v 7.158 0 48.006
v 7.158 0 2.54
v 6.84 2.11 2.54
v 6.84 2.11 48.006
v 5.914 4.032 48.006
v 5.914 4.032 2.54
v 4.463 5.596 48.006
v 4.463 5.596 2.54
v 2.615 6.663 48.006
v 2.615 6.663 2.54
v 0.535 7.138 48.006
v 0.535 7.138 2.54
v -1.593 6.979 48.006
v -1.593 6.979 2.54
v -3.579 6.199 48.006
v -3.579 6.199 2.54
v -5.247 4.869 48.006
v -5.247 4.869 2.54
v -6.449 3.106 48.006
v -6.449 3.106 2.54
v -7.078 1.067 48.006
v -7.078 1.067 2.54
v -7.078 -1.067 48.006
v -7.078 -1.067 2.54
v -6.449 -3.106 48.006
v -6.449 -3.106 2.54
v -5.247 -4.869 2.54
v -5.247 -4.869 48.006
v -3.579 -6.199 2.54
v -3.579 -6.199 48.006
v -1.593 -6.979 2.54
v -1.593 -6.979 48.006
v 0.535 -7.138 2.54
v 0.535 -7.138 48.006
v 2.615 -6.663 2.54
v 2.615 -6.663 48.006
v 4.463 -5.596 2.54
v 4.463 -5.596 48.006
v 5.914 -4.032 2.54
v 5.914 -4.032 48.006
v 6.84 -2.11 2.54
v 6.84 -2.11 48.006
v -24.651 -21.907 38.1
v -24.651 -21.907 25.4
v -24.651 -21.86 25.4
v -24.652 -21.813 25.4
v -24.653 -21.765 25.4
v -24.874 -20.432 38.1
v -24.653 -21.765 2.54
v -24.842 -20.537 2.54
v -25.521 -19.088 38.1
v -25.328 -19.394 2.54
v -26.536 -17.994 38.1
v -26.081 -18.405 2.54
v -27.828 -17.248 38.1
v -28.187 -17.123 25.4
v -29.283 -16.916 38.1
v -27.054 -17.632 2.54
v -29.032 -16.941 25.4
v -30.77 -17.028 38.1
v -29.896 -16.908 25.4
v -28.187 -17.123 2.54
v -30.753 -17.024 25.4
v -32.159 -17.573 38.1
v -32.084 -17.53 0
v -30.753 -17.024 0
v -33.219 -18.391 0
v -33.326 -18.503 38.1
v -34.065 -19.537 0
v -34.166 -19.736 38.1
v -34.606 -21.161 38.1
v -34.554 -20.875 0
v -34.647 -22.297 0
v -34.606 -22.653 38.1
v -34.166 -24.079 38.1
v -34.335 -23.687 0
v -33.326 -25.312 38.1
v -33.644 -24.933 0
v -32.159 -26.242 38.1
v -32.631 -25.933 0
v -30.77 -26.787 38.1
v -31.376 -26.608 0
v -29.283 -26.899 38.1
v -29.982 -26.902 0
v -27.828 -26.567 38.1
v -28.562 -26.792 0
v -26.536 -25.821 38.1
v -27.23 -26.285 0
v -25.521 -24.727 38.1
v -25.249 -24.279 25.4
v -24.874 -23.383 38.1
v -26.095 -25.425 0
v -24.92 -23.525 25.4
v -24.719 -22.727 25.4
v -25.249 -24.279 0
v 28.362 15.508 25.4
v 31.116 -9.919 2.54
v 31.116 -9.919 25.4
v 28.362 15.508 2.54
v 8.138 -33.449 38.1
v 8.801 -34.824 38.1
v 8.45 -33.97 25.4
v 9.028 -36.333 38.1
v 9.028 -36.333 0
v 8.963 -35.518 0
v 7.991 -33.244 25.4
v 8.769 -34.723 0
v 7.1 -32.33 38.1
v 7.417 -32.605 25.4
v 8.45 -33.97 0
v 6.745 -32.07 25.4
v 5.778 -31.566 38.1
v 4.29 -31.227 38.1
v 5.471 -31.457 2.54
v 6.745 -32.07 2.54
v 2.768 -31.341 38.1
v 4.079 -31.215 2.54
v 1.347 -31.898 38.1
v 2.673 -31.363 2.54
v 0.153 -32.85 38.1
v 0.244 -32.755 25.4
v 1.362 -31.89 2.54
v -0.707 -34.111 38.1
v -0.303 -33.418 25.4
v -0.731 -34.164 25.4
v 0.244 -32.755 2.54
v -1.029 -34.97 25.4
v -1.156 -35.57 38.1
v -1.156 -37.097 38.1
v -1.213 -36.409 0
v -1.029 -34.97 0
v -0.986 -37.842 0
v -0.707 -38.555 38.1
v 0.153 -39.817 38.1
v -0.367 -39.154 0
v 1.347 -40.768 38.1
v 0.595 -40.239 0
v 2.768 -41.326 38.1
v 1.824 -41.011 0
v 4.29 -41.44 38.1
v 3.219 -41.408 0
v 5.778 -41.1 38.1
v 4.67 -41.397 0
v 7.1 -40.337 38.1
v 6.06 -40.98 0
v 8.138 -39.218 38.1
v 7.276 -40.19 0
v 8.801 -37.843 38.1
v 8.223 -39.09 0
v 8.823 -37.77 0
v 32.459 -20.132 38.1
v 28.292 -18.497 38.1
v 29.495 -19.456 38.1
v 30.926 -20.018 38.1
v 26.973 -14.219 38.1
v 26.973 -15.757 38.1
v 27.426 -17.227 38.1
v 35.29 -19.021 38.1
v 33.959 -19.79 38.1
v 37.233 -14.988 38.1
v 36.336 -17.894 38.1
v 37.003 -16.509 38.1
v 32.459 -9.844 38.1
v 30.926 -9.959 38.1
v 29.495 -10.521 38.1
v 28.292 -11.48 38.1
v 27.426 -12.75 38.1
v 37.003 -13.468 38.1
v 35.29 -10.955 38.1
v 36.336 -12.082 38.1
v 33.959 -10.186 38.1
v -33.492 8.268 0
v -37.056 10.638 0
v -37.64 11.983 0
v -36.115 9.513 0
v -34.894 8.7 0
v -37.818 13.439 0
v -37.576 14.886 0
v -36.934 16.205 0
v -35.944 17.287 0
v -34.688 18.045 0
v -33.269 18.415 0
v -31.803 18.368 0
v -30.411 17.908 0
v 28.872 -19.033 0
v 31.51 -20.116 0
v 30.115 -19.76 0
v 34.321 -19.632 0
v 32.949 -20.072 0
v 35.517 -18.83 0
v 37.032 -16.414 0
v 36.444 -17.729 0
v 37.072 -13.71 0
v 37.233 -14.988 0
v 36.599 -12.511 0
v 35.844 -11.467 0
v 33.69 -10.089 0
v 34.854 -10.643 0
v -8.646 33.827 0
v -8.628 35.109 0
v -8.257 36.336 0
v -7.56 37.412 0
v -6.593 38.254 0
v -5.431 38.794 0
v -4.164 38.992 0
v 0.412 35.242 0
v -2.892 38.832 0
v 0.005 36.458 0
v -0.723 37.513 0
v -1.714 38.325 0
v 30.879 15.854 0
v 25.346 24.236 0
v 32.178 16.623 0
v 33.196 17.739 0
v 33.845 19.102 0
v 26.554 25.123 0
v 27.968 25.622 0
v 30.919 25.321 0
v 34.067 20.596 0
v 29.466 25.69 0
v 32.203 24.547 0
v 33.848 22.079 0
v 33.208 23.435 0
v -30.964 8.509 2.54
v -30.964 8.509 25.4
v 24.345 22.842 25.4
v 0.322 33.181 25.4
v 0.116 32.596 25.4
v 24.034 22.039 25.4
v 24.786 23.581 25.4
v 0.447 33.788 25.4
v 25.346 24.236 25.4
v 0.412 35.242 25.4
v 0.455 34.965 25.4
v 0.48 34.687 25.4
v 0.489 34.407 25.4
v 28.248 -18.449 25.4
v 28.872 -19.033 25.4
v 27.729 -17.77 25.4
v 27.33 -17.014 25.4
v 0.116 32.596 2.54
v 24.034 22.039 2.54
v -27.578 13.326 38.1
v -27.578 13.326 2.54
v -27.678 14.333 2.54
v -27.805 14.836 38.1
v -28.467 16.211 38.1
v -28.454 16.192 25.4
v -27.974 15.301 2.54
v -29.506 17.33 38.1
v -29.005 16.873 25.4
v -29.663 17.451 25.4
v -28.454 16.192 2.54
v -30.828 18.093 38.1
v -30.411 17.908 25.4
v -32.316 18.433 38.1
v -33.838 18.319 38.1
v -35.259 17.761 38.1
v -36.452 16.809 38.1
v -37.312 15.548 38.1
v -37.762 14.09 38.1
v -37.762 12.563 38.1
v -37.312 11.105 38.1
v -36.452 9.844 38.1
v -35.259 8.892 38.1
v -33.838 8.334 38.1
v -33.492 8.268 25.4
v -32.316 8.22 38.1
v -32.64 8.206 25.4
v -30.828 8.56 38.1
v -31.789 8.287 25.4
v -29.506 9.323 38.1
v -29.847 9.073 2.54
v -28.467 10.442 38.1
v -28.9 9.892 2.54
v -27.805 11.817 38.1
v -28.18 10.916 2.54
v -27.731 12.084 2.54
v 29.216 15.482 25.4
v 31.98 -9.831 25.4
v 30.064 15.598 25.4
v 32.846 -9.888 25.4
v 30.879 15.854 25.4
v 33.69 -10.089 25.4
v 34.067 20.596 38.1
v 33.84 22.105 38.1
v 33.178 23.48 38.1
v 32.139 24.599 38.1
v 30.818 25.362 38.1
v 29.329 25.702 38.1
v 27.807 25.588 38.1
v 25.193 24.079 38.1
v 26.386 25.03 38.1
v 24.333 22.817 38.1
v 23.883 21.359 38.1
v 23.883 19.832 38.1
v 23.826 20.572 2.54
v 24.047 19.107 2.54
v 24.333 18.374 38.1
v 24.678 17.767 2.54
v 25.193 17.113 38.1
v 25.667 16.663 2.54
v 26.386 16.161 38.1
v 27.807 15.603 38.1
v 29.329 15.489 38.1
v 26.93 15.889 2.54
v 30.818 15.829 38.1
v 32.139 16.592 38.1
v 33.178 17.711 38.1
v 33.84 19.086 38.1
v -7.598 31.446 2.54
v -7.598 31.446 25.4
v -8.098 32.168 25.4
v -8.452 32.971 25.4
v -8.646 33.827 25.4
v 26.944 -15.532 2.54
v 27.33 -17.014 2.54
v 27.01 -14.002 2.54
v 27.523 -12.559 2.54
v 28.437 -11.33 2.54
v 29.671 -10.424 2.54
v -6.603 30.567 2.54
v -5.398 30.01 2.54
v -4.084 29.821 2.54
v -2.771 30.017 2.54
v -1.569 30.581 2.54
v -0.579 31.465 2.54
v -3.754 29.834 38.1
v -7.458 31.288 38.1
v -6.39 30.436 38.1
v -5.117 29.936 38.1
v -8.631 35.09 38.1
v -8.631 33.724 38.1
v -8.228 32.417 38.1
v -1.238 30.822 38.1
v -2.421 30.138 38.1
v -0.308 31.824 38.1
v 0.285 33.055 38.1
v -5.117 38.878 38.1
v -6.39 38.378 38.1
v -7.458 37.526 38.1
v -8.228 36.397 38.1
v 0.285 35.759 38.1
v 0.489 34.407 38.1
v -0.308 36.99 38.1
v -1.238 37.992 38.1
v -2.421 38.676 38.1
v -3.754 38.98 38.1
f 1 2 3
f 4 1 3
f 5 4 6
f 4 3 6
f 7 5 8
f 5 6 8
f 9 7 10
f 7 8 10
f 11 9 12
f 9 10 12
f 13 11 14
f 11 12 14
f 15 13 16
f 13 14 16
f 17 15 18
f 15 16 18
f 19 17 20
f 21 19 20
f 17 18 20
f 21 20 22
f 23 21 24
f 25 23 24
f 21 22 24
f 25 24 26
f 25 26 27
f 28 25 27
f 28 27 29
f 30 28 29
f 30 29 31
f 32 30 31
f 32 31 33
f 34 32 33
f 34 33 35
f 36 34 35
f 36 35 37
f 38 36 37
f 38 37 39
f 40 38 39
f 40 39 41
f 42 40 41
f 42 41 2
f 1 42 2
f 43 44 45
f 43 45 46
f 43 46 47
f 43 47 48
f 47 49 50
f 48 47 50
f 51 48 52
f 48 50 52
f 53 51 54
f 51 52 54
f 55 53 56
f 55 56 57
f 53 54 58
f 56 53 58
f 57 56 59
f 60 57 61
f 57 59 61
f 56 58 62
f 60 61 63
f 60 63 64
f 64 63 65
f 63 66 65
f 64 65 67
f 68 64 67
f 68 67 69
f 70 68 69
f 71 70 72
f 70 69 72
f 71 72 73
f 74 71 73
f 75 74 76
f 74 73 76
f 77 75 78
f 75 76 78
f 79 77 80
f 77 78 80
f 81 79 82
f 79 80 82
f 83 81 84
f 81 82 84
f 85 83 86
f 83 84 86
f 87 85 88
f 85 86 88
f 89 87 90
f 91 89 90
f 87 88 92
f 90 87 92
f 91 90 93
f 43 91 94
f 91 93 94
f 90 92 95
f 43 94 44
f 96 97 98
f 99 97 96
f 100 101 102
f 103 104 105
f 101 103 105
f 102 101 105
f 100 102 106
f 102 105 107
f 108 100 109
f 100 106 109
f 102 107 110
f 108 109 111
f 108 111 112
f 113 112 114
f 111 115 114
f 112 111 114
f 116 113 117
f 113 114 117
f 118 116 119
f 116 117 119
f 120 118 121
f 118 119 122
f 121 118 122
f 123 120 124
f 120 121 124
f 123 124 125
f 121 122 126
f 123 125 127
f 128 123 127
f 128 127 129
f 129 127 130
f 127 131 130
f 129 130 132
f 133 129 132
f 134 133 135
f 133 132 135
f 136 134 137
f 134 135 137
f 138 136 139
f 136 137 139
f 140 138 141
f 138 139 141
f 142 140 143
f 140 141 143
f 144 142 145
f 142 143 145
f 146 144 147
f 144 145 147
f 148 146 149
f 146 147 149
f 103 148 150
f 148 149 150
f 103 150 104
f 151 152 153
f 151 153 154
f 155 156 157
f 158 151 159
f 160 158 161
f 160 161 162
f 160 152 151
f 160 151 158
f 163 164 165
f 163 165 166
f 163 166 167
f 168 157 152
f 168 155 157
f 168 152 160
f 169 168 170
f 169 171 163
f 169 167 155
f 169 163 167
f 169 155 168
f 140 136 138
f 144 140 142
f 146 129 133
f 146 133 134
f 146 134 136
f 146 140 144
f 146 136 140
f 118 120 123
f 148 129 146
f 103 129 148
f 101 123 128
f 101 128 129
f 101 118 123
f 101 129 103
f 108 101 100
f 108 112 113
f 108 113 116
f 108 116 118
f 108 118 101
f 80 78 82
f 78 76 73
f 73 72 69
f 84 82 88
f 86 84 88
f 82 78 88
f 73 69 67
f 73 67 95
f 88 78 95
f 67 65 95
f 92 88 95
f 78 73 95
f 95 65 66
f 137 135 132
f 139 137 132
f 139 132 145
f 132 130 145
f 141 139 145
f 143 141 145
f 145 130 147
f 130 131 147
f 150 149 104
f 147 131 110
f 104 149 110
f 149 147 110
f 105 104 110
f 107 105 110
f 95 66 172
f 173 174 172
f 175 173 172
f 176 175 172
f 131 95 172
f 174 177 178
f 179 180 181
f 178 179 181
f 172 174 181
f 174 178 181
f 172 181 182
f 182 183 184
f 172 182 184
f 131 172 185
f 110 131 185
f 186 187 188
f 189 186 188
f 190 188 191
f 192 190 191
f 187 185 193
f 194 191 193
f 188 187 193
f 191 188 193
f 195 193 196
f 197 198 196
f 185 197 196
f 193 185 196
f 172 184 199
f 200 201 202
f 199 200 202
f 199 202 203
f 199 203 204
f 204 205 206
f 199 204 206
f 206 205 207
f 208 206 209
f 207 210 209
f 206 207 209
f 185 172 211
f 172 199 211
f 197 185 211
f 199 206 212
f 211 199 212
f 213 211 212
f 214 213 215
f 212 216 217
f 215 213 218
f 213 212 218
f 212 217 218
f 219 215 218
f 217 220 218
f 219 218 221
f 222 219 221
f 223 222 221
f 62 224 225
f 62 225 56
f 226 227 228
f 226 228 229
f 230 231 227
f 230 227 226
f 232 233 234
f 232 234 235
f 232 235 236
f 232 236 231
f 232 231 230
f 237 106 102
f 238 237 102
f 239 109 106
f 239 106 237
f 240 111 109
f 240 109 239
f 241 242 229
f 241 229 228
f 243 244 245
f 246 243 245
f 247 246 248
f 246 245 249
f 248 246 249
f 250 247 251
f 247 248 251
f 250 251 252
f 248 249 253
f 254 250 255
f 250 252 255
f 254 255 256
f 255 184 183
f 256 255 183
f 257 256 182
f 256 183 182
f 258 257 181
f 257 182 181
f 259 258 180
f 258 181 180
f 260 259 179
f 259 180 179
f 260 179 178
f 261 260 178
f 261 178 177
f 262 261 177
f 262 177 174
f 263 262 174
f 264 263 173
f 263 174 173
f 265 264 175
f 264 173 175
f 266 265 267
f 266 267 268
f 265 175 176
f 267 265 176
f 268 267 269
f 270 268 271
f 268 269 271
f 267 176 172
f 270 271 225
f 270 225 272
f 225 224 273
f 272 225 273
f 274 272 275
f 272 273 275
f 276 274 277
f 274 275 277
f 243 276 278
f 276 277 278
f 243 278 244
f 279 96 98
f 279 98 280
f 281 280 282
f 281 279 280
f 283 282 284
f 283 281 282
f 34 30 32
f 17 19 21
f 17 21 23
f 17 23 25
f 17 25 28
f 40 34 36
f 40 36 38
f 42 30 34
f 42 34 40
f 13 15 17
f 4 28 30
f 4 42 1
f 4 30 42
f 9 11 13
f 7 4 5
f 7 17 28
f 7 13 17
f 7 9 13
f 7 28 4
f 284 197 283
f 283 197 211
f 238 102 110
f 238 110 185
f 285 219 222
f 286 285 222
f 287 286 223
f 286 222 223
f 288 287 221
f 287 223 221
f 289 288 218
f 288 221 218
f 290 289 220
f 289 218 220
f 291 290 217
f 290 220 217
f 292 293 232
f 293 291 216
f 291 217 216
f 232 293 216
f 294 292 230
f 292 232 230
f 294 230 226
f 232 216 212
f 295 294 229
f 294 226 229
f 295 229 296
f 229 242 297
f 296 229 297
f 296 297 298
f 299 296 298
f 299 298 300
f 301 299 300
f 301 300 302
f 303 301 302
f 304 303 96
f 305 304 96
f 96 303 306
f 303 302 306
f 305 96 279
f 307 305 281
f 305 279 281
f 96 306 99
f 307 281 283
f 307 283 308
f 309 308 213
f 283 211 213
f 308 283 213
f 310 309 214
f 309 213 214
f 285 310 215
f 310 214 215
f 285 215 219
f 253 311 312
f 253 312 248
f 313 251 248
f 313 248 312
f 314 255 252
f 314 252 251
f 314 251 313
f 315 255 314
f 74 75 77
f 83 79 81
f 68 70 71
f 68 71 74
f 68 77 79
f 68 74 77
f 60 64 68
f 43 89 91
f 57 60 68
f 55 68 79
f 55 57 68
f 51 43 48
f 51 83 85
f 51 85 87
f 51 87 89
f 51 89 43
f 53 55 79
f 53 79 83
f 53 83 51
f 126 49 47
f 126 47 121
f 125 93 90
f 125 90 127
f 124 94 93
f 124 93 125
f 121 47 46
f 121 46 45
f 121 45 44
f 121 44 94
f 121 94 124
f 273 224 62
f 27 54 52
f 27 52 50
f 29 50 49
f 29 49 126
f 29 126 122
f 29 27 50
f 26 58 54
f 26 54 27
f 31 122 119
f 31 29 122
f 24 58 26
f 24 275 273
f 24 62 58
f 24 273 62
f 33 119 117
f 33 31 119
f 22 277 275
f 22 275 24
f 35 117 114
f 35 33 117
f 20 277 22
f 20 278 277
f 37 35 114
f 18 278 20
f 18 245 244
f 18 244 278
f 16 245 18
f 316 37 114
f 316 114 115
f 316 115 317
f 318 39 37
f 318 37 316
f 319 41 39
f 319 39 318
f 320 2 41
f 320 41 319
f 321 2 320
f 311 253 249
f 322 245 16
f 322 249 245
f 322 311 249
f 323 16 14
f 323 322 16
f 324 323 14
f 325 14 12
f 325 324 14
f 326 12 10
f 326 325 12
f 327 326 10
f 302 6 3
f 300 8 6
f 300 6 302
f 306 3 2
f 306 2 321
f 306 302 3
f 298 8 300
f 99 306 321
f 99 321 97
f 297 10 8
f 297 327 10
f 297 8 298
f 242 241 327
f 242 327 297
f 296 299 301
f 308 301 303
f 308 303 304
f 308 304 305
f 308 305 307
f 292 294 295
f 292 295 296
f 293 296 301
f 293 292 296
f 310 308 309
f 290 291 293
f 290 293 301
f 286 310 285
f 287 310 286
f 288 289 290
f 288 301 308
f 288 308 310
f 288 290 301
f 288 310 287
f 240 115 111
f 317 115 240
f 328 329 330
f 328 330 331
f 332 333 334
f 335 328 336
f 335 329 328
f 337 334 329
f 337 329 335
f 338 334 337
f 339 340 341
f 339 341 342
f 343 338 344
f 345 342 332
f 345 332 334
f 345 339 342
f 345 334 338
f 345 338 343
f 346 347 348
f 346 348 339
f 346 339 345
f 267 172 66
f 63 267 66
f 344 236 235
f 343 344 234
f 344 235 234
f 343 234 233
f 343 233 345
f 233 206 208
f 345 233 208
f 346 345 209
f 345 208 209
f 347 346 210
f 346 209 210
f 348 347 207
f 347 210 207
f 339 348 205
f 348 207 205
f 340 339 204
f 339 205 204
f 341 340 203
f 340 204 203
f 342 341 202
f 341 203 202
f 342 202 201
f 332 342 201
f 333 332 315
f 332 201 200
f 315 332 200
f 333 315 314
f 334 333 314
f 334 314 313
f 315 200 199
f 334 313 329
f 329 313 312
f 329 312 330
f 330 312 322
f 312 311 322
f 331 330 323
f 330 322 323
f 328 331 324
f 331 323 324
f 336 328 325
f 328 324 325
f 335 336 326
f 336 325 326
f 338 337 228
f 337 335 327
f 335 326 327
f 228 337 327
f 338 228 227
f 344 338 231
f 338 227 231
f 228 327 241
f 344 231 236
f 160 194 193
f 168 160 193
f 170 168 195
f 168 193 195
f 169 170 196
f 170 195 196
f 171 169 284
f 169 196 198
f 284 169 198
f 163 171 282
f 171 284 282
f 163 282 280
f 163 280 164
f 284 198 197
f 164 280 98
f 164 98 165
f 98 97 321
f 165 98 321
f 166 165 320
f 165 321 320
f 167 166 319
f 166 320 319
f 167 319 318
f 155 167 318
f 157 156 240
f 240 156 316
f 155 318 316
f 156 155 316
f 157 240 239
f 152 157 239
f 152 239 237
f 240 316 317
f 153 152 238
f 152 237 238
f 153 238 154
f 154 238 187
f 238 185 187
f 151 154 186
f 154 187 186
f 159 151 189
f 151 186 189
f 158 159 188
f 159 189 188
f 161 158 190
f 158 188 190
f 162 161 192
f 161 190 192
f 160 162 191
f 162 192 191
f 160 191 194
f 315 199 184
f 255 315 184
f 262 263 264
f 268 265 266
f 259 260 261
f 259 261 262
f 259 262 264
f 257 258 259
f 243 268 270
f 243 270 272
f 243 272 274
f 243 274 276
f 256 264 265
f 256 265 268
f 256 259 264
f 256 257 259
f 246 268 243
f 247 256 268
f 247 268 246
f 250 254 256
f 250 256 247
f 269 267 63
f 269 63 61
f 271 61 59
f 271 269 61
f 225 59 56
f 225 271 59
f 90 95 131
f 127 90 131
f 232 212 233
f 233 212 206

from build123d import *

# Parameters (mm, degrees)
F1_DEPTH  = 25.4
F2_T      = -2.54
F3_R      = 7.158021
F4_DEPTH  = 48.006
F5_R      = 5.120682
F11_DEPTH = 38.1
F10_R     = 5.120996
F12_DEPTH = 38.1
F9_R      = 5.158628
F13_DEPTH = 38.1
F7_R      = 5.120684
F14_DEPTH = 38.1
F6_R      = 5.005345
F15_DEPTH = 38.1
F8_R      = 4.585724
F16_DEPTH = 38.1


with BuildPart() as f1:
    # F0 (on Top) → F1 (new body)
    with BuildSketch(Plane.XY):
        Polygon((4.030147, -37.202981), (34.2338, -15.111281), (30.203654, 22.0917), (-4.030147, 37.202981), (-34.2338, 15.111281), (-30.203654, -22.0917), align=None)
    extrude(amount=F1_DEPTH)

    # F2
    f2_openings = [f1.faces().sort_by_distance(p)[0] for p in [
        (0, 0, 25.4),
    ]]
    offset(amount=F2_T, openings=f2_openings)

    # F3 (on Top) → F4 (join)
    with BuildSketch(Plane.XY):
        Circle(F3_R)
    extrude(amount=F4_DEPTH)

    # F5 (on Top) → F11 (join)
    with BuildSketch(Plane.XY):
        with Locations((28.946722, 20.595593)):
            Circle(F5_R)
    extrude(amount=F11_DEPTH)

    # F10 (on Top) → F12 (join)
    with BuildSketch(Plane.XY):
        with Locations((3.907301, -36.333404)):
            Circle(F10_R)
    extrude(amount=F12_DEPTH)

    # F9 (on Top) → F13 (join)
    with BuildSketch(Plane.XY):
        with Locations((32.073971, -14.988269)):
            Circle(F9_R)
    extrude(amount=F13_DEPTH)

    # F7 (on Top) → F14 (join)
    with BuildSketch(Plane.XY):
        with Locations((-32.698333, 13.326479)):
            Circle(F7_R)
    extrude(amount=F14_DEPTH)

    # F6 (on Top) → F15 (join)
    with BuildSketch(Plane.XY):
        with Locations((-29.656565, -21.907367)):
            Circle(F6_R)
    extrude(amount=F15_DEPTH)

    # F8 (on Top) → F16 (join)
    with BuildSketch(Plane.XY):
        with Locations((-4.096689, 34.406971)):
            Circle(F8_R)
    extrude(amount=F16_DEPTH)


solid = f1.part
